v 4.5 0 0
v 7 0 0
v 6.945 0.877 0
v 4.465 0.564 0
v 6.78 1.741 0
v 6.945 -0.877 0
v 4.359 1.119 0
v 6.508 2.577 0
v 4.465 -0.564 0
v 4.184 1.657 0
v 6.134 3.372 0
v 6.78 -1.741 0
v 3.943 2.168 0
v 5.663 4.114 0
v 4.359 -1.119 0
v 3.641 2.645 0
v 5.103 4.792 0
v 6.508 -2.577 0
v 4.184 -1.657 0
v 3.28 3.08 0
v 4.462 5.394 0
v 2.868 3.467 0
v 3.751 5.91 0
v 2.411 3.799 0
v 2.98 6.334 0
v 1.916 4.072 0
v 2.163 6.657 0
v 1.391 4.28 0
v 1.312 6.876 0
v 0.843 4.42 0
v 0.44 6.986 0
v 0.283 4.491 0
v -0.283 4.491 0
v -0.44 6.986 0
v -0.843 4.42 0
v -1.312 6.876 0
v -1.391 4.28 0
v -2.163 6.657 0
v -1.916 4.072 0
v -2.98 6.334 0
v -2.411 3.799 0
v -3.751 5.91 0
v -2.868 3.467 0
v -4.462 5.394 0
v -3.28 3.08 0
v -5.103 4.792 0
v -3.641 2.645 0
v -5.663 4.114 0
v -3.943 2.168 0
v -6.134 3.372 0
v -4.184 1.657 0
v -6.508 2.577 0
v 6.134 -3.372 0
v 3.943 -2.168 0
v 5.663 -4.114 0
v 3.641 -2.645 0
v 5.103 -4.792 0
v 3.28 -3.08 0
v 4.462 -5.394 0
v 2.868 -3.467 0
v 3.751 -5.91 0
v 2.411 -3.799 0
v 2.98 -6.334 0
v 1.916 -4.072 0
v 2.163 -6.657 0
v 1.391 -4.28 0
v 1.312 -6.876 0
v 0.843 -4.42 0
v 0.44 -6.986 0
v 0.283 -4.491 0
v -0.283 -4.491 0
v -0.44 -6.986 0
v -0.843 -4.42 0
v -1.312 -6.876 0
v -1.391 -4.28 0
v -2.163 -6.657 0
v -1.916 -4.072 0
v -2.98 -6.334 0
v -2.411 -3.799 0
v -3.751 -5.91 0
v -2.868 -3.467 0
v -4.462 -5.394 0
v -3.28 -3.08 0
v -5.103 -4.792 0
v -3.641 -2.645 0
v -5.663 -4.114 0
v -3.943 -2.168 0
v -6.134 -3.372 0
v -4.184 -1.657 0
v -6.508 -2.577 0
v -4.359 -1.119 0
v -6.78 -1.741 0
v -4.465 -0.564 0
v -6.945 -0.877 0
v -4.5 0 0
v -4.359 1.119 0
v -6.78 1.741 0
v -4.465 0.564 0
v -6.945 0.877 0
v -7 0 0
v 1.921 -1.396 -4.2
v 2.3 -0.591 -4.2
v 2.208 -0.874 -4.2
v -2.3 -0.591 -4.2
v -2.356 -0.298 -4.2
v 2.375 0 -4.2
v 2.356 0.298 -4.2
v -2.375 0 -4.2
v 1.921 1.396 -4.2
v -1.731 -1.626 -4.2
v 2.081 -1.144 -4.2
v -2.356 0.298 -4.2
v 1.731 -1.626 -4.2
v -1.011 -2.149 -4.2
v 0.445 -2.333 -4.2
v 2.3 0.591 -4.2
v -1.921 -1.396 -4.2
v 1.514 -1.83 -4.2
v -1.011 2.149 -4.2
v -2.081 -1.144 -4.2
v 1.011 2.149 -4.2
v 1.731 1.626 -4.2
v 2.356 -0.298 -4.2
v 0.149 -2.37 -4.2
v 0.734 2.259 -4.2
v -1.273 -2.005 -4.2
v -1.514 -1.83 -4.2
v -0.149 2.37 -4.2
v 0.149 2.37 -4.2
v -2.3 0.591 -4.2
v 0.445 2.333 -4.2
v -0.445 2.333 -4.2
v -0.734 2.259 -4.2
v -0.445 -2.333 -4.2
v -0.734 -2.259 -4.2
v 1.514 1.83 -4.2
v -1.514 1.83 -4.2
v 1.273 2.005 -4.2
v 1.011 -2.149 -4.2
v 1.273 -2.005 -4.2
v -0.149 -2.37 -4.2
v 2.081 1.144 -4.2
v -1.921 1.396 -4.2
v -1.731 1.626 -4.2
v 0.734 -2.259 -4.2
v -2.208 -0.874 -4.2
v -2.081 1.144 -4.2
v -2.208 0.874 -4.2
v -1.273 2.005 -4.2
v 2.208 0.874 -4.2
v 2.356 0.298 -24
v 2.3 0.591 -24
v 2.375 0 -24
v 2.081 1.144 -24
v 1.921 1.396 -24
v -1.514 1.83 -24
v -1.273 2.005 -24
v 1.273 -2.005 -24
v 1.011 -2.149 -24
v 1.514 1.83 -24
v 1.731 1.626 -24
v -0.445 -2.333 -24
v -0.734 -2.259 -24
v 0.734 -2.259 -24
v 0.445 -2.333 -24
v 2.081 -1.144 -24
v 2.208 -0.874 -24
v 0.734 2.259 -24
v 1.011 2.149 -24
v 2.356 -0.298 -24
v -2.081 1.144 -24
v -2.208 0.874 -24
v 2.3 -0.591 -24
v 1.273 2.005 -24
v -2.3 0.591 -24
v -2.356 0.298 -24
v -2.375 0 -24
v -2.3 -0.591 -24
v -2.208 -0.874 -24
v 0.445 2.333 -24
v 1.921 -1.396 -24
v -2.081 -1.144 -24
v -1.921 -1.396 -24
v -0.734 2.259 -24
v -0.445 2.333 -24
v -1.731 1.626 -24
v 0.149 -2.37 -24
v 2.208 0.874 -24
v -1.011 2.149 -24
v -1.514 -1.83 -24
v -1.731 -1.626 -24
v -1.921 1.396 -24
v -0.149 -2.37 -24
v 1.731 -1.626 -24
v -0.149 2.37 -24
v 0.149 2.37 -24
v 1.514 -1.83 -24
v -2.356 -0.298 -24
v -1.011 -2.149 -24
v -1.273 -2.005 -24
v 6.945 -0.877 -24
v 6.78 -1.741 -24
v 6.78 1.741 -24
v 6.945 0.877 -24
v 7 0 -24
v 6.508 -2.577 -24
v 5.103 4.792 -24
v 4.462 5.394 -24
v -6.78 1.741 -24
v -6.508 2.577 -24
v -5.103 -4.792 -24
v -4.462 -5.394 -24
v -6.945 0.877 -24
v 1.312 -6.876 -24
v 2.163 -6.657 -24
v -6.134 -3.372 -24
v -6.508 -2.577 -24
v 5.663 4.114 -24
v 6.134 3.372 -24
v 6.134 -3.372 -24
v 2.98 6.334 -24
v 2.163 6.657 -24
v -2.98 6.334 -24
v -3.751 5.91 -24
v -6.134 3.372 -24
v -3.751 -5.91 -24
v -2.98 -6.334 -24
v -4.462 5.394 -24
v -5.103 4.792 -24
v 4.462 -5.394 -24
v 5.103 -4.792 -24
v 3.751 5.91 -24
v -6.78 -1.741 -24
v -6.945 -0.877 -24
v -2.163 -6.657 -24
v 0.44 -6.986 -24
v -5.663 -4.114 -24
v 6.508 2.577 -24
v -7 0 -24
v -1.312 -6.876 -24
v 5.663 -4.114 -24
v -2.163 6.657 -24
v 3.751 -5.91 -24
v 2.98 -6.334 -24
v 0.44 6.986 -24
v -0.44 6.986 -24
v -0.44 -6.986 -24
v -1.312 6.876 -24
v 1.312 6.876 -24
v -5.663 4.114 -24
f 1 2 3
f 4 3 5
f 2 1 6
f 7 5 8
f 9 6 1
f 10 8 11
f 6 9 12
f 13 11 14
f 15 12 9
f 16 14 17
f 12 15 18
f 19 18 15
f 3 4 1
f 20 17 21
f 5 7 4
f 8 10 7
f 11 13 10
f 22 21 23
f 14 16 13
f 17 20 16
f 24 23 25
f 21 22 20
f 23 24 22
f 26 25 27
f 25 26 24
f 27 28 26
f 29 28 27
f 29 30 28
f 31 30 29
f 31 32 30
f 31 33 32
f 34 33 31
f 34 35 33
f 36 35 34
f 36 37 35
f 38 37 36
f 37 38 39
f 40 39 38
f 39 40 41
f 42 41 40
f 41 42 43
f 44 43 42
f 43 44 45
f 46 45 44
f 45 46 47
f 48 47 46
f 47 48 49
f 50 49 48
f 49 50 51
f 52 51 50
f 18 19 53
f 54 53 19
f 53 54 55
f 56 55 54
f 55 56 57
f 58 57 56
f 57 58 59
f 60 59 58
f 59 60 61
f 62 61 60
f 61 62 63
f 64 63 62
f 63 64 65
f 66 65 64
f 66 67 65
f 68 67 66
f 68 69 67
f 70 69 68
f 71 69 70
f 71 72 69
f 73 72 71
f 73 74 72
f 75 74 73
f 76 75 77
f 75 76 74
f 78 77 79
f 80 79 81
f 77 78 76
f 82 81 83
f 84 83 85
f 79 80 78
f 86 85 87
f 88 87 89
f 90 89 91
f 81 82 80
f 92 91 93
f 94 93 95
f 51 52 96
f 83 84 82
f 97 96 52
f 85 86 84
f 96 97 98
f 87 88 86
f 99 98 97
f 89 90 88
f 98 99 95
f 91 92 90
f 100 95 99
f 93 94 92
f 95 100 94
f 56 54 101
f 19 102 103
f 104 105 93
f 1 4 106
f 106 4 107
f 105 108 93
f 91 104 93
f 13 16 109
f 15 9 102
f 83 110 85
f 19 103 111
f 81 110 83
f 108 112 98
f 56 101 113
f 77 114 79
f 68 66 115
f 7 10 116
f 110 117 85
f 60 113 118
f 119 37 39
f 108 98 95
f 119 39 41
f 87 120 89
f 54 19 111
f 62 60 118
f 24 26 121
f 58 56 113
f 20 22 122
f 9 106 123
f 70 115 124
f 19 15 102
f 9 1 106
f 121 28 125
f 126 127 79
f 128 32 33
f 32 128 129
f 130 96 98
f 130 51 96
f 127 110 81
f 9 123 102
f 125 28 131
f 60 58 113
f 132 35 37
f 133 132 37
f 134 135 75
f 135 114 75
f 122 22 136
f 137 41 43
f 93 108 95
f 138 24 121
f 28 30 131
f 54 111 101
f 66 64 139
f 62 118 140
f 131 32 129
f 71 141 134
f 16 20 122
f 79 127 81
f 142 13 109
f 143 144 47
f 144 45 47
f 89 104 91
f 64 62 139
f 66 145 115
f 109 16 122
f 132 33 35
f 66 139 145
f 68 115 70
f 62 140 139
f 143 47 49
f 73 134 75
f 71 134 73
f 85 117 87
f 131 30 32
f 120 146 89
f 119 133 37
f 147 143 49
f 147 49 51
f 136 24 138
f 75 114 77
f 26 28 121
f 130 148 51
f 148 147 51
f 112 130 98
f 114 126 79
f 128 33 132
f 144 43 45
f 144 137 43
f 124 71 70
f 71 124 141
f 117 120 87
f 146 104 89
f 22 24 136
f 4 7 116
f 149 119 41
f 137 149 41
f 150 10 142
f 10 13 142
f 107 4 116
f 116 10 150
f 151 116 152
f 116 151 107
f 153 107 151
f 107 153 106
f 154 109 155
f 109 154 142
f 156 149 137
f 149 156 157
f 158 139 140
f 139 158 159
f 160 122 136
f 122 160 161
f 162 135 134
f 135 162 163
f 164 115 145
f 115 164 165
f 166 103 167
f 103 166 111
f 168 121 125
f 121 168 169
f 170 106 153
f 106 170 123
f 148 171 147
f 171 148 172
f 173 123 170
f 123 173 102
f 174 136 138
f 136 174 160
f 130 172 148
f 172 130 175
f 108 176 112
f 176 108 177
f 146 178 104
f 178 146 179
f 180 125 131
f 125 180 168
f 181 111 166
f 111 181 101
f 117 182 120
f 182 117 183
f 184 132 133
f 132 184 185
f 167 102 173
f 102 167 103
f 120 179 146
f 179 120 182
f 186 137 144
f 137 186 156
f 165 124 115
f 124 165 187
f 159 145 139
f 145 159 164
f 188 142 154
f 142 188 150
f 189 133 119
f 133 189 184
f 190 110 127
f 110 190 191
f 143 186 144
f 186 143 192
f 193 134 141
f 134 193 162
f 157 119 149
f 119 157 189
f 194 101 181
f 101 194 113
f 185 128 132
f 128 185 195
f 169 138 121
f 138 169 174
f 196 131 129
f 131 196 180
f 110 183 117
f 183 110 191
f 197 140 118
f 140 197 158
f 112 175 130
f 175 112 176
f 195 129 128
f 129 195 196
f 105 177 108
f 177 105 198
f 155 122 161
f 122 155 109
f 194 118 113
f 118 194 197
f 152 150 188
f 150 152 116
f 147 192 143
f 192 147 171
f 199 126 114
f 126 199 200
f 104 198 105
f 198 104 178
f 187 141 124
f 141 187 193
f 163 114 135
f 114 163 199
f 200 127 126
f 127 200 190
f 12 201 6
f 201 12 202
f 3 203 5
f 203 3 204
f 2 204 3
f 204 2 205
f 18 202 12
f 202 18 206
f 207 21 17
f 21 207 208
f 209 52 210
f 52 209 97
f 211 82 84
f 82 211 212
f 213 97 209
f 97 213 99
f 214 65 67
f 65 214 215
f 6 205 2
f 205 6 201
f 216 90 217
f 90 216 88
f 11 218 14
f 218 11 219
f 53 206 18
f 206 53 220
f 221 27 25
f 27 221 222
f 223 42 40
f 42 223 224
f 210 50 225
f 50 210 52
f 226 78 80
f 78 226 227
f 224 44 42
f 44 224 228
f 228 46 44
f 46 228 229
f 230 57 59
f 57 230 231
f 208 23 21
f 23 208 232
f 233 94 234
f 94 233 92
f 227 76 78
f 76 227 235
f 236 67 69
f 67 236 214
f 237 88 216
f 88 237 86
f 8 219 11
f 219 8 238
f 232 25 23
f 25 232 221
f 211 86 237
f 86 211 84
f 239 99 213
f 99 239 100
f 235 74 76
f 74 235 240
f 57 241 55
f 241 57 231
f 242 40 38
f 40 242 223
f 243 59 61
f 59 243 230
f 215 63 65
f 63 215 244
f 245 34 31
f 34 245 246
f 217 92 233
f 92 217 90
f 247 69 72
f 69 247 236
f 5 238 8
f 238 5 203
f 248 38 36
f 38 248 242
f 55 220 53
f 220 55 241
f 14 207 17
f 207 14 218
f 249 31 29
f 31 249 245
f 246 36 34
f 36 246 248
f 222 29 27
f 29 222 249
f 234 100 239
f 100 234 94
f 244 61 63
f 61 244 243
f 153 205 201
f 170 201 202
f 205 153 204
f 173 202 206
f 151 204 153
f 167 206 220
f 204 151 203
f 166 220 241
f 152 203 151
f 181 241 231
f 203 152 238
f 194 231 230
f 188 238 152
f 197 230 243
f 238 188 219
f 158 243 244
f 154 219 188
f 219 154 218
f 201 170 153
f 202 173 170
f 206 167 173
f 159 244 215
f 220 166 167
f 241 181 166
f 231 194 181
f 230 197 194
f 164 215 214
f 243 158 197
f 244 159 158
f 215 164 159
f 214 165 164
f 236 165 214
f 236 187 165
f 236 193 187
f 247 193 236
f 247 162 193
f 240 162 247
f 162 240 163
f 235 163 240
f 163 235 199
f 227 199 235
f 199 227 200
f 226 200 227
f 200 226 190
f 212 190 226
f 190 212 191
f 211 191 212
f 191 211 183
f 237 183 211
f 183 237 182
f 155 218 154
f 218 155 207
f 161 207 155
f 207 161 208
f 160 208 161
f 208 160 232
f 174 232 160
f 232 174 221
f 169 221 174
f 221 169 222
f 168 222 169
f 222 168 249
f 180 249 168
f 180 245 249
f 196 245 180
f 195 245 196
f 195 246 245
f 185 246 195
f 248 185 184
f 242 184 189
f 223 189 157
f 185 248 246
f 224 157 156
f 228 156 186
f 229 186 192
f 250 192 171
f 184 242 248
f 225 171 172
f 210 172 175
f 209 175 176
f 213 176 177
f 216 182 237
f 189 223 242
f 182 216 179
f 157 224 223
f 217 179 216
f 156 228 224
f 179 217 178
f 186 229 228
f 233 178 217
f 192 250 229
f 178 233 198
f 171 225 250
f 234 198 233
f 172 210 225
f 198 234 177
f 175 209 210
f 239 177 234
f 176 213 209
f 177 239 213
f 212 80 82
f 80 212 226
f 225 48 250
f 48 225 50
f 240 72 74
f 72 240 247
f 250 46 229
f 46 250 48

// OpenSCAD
$fn = 50;

difference() {
	union() {
		translate(v = [0, 0, -24.0]) {
			cylinder(h = 24, r = 7.0);
		}
	}
	union() {
		translate(v = [0, 0, 0]) {
			rotate(a = [0, 0, 0]) {
				difference() {
					union() {
						translate(v = [0, 0, -27.0]) {
							cylinder(h = 27, r = 2.25);
						}
						translate(v = [0, 0, -4.2]) {
							cylinder(h = 4.2, r1 = 2.375, r2 = 4.5);
						}
						translate(v = [0, 0, -27.0]) {
							cylinder(h = 27, r = 2.375);
						}
						translate(v = [0, 0, -27.0]) {
							cylinder(h = 27, r = 2.25);
						}
					}
					union();
				}
			}
		}
	}
}
